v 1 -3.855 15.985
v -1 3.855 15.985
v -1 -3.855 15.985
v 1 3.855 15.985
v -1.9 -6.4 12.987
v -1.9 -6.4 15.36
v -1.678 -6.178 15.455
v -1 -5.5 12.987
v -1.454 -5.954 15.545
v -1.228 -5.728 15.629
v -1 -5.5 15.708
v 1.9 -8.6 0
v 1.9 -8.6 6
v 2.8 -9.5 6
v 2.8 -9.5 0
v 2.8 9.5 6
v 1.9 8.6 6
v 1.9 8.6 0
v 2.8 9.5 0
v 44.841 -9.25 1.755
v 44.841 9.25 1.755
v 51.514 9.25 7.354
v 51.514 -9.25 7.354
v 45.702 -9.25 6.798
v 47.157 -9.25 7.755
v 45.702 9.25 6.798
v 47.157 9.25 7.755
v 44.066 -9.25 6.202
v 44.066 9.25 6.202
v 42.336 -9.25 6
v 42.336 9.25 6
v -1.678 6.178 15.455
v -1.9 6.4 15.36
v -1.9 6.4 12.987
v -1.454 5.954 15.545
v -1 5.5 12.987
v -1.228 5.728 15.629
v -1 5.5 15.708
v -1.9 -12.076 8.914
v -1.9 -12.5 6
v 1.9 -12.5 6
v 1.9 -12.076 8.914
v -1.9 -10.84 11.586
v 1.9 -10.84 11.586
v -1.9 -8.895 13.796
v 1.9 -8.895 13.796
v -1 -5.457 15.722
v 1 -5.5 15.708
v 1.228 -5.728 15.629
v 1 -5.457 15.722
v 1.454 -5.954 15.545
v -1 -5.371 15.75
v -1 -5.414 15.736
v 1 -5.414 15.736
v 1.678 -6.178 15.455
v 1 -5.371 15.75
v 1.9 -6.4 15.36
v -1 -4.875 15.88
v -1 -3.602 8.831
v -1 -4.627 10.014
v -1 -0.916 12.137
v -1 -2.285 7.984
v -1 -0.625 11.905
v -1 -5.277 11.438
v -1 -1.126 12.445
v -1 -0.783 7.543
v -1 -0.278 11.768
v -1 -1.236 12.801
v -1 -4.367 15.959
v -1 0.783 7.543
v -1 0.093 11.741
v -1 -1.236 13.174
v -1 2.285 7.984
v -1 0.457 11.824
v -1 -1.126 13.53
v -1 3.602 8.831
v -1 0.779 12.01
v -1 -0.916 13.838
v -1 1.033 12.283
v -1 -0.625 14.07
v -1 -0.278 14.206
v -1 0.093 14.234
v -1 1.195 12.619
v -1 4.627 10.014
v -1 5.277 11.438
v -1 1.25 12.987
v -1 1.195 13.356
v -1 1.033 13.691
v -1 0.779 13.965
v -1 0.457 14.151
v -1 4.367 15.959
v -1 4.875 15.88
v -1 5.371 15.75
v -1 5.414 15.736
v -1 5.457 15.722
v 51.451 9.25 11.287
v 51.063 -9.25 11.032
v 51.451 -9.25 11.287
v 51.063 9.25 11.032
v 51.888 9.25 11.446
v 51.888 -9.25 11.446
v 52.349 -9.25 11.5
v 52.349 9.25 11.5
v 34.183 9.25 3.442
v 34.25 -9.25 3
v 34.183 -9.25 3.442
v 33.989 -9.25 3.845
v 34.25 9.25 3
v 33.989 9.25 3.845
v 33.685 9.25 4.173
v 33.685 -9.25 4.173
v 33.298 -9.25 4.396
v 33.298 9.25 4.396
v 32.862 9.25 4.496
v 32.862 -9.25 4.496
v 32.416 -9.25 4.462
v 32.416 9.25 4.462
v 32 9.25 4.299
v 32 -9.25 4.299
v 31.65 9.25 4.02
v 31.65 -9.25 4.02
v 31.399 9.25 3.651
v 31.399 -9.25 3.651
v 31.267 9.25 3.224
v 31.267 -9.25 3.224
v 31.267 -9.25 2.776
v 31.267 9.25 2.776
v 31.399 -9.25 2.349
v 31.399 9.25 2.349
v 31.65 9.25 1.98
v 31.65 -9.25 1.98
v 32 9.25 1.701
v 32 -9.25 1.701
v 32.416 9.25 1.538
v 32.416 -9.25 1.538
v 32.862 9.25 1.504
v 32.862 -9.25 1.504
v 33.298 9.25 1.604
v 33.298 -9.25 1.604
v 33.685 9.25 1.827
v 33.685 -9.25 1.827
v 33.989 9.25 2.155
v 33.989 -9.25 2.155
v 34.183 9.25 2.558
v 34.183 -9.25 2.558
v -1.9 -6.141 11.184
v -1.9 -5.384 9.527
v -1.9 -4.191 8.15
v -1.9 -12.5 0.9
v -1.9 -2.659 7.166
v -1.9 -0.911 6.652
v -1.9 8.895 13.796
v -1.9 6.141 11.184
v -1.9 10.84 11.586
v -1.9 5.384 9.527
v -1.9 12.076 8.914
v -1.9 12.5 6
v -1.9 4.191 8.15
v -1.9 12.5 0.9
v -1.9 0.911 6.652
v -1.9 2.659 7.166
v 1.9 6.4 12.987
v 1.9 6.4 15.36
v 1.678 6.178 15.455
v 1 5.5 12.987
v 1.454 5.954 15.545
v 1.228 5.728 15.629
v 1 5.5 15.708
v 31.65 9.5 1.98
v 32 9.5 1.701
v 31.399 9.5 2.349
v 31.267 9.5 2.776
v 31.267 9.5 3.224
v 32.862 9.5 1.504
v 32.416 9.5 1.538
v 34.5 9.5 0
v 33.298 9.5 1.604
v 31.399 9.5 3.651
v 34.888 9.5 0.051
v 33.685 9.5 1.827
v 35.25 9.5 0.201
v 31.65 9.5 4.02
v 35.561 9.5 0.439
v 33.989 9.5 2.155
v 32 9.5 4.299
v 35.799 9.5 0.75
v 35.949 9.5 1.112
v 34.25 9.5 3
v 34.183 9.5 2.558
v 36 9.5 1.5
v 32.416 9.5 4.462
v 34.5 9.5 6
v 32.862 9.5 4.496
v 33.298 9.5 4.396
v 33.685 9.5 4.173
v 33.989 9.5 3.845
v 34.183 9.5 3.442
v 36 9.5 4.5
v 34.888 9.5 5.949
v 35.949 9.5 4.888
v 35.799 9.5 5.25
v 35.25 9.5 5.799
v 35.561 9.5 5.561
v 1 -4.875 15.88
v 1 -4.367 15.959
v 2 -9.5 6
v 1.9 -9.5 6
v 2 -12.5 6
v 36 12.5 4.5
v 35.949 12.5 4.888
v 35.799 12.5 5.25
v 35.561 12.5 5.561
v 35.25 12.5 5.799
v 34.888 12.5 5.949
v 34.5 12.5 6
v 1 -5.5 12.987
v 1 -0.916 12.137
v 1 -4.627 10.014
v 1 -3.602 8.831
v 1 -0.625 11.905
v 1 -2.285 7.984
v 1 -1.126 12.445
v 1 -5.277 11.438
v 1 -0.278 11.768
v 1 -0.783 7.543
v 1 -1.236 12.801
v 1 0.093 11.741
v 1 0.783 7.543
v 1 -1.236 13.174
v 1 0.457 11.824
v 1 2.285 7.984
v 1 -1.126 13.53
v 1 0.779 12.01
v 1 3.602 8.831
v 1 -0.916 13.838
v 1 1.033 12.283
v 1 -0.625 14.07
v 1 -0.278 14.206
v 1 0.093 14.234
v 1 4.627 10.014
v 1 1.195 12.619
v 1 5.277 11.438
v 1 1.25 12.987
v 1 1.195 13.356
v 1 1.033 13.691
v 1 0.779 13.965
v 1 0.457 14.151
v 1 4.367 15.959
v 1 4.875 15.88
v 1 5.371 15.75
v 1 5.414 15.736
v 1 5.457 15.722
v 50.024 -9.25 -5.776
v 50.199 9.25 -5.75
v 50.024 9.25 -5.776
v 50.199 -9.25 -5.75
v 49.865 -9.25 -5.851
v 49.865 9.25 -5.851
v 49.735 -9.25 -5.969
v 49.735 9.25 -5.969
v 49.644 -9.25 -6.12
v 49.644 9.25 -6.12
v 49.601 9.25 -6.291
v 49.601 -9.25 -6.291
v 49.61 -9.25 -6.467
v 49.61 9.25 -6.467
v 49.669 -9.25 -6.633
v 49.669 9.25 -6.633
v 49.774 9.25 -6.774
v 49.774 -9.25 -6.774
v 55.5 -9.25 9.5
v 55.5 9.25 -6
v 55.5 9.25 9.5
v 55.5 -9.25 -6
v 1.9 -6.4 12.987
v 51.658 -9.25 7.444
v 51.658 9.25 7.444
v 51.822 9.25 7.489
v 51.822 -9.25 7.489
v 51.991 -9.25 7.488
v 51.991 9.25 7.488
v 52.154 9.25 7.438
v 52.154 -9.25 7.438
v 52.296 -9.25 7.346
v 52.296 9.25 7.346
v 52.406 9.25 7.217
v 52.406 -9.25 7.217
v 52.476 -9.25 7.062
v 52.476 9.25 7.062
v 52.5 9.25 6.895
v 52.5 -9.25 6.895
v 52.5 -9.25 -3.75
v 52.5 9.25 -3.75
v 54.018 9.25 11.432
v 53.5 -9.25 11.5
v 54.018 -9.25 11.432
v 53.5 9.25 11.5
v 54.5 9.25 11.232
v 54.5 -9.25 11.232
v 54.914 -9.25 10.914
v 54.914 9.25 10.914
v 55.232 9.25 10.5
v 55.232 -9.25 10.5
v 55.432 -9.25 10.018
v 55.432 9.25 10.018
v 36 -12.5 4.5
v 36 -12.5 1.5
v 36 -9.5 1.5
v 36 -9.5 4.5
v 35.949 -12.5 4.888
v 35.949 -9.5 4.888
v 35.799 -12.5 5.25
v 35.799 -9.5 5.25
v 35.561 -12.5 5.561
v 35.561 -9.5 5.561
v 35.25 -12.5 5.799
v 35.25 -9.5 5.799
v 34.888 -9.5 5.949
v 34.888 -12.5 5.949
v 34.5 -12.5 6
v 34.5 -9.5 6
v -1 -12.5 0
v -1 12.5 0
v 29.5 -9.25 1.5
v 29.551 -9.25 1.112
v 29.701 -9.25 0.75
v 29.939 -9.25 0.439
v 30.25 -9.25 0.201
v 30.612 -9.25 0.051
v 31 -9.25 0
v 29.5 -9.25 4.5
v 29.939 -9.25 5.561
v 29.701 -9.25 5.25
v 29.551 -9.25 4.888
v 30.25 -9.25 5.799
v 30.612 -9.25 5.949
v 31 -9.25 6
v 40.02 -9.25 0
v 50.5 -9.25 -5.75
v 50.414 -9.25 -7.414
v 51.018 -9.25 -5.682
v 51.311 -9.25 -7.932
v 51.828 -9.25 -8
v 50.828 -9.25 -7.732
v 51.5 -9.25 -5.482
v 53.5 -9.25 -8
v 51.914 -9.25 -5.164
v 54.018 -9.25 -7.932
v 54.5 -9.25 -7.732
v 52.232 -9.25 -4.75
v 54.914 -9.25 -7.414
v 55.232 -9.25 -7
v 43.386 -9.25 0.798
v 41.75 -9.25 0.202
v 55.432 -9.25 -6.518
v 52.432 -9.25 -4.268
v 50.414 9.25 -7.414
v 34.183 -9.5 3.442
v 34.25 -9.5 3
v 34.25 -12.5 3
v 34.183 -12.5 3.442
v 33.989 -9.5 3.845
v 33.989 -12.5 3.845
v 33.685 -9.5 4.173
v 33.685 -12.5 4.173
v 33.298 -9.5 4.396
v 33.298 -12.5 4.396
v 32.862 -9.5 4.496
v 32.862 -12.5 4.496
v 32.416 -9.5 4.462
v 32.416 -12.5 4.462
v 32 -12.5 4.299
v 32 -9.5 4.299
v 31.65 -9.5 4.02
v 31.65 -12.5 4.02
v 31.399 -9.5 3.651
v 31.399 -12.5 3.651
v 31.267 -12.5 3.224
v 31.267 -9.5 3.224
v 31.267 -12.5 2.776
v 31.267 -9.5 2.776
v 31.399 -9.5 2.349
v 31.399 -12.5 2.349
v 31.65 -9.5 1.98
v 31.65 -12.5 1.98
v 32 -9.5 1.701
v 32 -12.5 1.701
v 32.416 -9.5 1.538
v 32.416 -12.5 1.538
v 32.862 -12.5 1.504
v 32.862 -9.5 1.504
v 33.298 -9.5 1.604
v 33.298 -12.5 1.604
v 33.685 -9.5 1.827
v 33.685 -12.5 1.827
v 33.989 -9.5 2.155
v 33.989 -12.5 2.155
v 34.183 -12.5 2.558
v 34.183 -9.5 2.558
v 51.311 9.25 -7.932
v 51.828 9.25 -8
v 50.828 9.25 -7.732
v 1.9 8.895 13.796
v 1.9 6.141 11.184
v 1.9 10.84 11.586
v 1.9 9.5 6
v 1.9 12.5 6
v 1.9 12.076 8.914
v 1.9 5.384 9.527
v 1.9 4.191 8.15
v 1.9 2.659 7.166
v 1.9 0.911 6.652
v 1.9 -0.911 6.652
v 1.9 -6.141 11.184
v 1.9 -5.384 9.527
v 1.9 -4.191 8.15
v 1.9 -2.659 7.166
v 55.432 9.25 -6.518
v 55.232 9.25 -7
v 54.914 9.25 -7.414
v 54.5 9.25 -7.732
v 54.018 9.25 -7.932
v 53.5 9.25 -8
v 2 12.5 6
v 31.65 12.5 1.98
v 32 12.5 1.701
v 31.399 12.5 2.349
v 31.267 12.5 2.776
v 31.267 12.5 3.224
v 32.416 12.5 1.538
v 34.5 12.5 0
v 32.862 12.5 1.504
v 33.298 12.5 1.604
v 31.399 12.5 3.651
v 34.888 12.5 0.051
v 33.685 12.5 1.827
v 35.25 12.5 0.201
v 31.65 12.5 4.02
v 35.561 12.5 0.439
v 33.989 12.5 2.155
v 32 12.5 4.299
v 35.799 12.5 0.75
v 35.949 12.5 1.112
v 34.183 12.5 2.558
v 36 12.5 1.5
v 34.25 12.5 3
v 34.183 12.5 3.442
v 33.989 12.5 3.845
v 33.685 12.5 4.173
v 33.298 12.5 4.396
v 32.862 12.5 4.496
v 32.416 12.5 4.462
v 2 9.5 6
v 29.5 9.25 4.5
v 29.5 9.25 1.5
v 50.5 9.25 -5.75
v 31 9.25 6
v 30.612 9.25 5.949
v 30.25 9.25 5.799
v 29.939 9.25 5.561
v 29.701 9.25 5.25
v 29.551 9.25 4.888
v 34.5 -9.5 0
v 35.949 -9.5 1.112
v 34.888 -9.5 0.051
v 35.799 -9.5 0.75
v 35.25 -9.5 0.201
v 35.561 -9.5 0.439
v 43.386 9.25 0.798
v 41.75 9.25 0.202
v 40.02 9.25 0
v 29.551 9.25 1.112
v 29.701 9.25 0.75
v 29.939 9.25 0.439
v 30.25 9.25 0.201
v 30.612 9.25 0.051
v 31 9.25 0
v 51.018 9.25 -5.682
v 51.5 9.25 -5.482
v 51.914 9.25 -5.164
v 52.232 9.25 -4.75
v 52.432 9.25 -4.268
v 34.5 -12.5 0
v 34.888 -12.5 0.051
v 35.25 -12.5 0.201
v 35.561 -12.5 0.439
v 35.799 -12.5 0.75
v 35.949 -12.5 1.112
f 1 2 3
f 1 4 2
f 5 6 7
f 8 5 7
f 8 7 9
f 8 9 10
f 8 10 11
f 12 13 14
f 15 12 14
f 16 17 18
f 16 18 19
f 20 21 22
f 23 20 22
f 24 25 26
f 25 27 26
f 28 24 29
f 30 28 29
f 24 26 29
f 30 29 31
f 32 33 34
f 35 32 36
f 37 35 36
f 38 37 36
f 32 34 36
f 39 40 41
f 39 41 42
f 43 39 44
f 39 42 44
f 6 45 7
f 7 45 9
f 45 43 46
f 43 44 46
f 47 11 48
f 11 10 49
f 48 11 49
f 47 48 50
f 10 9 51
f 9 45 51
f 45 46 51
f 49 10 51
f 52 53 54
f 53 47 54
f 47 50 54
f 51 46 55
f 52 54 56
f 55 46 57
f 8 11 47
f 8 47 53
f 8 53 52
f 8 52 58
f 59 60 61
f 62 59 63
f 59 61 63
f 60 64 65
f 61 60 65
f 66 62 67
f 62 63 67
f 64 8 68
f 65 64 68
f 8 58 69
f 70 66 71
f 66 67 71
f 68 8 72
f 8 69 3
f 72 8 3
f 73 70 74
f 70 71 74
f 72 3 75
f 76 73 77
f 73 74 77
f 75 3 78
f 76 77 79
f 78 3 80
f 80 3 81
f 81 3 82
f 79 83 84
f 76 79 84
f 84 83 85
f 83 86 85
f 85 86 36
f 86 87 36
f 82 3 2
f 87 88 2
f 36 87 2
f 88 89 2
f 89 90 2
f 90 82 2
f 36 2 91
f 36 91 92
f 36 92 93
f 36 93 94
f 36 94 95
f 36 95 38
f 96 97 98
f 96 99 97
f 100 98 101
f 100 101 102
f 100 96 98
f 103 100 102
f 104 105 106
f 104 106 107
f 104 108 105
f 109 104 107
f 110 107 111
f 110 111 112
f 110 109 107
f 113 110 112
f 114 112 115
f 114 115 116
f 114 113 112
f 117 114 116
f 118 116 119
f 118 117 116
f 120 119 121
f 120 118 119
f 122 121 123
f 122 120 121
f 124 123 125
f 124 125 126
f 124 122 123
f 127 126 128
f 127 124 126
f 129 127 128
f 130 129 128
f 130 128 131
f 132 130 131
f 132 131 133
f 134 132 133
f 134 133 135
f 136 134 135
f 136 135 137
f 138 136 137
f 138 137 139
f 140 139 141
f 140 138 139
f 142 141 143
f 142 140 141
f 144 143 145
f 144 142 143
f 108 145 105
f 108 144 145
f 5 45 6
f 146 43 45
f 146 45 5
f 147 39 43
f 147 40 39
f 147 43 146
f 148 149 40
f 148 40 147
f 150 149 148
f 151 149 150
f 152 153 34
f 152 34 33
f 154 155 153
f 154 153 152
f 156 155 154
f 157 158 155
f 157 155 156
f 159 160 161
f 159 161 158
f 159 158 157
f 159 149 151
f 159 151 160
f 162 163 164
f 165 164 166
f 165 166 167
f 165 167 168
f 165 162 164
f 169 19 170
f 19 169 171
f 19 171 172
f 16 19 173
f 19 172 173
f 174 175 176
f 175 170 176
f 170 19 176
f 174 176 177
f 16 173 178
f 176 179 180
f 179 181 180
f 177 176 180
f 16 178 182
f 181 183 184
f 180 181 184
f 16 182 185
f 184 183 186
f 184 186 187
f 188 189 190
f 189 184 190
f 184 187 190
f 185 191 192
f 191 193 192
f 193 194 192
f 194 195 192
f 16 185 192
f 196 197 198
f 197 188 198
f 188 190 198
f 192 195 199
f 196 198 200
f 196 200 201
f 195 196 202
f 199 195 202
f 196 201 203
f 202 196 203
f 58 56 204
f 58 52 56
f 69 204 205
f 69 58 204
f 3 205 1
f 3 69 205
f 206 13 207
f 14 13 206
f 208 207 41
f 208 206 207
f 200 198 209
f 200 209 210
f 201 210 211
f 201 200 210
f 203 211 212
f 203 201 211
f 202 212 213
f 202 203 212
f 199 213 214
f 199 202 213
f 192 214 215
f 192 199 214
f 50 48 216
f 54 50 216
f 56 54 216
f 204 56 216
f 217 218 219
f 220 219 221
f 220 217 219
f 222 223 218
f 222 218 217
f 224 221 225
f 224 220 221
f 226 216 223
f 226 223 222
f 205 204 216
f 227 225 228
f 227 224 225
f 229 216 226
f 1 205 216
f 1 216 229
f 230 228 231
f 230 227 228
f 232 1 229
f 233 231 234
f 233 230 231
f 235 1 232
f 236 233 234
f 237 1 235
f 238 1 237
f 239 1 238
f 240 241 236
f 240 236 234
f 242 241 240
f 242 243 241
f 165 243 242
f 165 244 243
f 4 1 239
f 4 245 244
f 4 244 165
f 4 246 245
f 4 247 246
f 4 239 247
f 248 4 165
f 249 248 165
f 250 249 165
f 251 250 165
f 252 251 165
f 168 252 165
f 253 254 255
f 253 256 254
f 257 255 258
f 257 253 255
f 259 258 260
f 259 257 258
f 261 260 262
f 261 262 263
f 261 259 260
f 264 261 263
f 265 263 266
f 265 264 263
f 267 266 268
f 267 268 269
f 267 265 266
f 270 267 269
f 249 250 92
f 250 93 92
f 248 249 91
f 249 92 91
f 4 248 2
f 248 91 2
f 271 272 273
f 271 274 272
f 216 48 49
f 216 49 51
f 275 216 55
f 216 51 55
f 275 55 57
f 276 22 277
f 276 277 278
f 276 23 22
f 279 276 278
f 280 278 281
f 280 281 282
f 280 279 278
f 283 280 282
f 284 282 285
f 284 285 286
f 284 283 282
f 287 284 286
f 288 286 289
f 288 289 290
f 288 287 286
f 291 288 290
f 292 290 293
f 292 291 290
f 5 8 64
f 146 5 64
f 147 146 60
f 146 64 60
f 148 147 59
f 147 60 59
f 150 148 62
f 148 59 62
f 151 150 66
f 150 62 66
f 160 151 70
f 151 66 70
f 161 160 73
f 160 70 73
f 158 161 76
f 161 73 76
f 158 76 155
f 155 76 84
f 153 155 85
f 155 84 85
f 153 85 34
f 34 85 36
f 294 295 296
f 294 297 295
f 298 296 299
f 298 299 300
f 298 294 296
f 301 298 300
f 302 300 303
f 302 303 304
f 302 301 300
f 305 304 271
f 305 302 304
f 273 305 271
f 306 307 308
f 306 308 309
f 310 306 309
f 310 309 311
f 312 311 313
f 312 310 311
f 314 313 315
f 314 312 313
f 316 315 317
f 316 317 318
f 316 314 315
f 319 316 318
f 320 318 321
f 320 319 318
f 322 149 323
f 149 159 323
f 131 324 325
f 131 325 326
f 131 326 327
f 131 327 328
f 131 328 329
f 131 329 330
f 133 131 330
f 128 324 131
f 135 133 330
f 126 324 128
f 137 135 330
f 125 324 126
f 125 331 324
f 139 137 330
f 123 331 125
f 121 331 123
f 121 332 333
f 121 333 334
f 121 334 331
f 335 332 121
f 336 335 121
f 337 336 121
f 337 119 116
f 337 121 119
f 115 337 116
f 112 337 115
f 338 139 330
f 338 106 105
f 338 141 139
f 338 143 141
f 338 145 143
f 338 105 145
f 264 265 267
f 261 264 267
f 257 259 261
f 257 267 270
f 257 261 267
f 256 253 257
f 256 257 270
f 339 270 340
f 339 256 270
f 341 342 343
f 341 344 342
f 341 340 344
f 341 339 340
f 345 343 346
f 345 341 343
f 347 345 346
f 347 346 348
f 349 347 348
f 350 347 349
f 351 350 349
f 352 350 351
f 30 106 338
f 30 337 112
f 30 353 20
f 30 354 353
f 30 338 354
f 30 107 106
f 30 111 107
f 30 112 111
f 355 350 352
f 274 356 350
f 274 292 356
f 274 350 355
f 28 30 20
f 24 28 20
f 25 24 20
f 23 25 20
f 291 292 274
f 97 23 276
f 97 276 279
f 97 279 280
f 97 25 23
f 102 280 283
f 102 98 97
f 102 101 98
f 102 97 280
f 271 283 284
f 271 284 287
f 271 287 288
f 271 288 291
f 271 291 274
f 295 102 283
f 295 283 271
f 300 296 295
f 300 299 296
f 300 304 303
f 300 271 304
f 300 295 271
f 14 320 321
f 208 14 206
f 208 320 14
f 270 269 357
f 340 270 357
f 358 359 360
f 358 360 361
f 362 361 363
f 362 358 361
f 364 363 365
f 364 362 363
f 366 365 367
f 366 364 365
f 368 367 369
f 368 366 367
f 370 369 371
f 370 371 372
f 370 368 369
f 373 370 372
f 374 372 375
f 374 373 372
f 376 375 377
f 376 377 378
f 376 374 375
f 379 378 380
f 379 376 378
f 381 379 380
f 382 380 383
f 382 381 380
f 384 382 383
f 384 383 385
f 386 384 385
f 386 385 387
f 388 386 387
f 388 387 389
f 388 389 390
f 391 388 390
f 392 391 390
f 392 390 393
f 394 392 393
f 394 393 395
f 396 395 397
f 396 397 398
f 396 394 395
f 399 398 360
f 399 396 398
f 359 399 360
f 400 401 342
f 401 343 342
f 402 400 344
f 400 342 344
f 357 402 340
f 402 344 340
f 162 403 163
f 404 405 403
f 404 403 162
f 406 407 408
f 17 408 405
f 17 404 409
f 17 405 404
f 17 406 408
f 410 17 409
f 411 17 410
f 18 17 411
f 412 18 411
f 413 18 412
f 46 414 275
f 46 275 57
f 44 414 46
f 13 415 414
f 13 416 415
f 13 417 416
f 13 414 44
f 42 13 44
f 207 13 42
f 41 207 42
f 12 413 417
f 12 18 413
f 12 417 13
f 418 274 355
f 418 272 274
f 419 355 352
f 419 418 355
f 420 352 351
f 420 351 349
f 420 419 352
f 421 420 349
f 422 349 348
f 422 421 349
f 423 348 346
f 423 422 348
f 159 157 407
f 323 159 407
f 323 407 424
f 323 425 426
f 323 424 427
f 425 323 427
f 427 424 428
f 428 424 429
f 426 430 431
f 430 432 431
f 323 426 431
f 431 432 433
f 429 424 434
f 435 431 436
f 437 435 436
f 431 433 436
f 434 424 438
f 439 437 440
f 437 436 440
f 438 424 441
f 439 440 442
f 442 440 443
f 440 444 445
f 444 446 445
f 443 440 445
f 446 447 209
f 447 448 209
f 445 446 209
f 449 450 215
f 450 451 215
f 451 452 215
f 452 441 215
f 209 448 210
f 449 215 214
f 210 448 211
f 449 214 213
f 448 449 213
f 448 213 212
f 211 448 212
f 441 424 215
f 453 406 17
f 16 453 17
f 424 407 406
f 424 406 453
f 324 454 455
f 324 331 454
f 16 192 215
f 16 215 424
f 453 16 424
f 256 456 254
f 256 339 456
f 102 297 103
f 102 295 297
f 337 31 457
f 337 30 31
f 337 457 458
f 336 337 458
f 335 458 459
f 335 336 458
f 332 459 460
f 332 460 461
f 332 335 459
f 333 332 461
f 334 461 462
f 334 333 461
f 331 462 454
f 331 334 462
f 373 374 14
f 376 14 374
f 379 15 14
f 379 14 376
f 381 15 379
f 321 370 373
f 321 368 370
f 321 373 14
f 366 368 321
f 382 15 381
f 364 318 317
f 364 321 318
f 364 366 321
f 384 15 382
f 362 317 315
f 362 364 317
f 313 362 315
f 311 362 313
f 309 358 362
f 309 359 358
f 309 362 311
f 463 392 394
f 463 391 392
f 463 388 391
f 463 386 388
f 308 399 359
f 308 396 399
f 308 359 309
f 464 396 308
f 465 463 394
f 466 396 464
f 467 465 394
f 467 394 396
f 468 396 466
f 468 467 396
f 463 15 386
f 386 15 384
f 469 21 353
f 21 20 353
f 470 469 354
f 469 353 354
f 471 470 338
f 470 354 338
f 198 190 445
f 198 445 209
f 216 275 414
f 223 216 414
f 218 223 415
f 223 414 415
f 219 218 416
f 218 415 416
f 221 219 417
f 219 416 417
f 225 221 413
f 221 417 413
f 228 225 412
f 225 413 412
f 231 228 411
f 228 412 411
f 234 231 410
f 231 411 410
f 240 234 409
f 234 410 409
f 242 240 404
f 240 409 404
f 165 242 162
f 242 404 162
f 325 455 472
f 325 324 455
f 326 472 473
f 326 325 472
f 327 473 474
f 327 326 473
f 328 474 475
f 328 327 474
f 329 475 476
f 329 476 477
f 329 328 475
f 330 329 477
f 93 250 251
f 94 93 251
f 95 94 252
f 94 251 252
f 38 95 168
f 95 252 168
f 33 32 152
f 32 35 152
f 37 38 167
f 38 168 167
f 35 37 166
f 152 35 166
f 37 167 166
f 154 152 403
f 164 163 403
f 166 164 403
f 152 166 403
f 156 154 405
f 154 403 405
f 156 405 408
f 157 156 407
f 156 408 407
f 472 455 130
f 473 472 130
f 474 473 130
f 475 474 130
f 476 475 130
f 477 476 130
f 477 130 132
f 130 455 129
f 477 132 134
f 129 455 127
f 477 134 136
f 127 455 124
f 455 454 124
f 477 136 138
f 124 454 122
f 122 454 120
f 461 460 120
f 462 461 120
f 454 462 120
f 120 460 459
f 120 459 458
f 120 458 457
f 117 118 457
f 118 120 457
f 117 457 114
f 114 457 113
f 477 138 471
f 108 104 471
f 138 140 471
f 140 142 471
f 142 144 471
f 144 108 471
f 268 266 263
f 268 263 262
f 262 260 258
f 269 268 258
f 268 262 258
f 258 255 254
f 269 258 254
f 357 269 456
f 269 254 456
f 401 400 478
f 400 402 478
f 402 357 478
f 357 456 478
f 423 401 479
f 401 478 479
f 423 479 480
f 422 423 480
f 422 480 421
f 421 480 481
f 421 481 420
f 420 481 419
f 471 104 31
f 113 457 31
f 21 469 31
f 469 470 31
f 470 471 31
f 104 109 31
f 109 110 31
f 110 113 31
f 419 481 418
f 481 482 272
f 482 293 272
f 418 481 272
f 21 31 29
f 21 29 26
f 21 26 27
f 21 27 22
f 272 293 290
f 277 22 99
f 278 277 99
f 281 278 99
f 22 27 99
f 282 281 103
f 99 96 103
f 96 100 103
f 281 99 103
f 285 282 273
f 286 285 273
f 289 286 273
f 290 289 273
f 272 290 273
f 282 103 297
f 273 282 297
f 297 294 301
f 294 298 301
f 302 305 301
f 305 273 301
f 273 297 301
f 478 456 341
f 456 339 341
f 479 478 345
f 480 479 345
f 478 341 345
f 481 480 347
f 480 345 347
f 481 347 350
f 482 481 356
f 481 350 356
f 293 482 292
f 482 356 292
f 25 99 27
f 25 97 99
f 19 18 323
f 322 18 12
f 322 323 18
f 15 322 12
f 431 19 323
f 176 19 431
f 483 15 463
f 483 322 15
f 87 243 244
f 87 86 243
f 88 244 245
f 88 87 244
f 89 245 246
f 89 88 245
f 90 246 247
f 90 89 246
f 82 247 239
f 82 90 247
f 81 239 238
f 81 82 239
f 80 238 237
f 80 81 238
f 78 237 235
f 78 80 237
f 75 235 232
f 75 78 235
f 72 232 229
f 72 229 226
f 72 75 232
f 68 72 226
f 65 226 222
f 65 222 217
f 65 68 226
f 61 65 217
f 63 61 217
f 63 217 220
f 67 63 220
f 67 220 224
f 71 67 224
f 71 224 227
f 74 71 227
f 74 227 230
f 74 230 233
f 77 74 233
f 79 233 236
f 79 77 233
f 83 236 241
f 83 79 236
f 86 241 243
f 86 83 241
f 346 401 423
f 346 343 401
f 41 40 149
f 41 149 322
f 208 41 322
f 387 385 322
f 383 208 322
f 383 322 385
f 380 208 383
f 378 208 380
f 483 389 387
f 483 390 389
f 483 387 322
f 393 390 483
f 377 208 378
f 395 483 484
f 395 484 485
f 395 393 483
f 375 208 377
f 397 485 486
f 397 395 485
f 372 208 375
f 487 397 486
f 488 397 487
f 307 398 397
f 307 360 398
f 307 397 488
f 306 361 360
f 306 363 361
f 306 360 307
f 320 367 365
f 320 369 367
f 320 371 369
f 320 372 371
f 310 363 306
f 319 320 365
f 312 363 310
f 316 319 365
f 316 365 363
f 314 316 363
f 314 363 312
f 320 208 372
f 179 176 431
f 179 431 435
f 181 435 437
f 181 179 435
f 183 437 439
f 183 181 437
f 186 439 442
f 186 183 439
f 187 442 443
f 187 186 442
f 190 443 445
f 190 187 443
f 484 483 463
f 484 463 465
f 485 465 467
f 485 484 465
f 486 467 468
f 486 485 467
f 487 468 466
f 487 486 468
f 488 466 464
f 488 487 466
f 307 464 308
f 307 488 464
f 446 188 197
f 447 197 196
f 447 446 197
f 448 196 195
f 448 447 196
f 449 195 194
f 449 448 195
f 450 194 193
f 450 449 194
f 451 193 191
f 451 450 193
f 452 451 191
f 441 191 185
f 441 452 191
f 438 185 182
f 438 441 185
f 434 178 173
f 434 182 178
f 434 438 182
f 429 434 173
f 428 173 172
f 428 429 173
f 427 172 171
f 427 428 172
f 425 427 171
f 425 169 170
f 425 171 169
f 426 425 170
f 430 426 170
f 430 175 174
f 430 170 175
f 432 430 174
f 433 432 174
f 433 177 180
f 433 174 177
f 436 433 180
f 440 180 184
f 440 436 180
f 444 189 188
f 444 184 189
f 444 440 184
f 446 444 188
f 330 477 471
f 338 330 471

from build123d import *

# Parameters (mm, degrees)
F2_R          = 1.5
F5_DEPTH      = 12.5
F3_W          = 57.0000079349
F3_H          = 35
F3_W_2        = 5.9000002086
F3_H_2        = 3.0000003055
F6_DEPTH      = 25
F0_W          = 40
F0_H          = 30
F0_R          = 1.2500888111
F7_DEPTH      = 2
F8_DEPTH      = 1
F9_DEPTH      = 0.1
F10_DEPTH     = 0.1
F11_T4_DEPTH  = 8.3145145654
F11_T9_DEPTH  = 8.3145145654
F11_T11_DEPTH = 29.6290293933
F11_T16_ANGLE = 180
F11_T21_ANGLE = 180
F11_T26_DEPTH = 5.2499087538
F11_T31_DEPTH = 5.2499087441
F11_T36_DEPTH = 5.2499087441
F11_T41_DEPTH = 5.2499087538
F4_R          = 1.5
F12_DEPTH     = 9.25
F13_R         = 2
F14_R         = 7.5
F15_R         = 0.6
F1_W          = 40
F1_H          = 30
F16_DEPTH     = 12.5
F17_R         = 5


# Not quite as in the source:
# - a fillet or chamfer that OpenCascade refuses, or shapes differently, is made with other operations: its cross-section is extruded or revolved along the edge and cut away or added
# - ends of sketch curves that miss each other by under 0.0002 mm in the source are joined


with BuildPart() as f5:
    # F2 (on Front) → F5 (new body, symmetric)
    with BuildSketch(Plane.XZ):
        with BuildLine():
            Line((-6.5000004037, -1.225e-07), (34.4999995679, -1.225e-07))
            ThreePointArc((34.4999995679, -1.225e-07), (35.5606597229, 0.4393396988), (35.9999995441, 1.4999998538))
            Line((35.9999995441, 1.4999998538), (35.9999995441, 4.4999998063))
            ThreePointArc((35.9999995441, 4.4999998063), (35.5606597229, 5.5606599613), (34.4999995679, 5.9999997825))
            Line((34.4999995706, 5.9999997825), (1.9999998119, 5.9999998409))
            Line((1.9999998119, 5.999999905), (1.9999998119, 16))
            Line((1.9999998119, 16), (-2.000000095, 16))
            Line((-2.000000095, 16), (-2.000000095, 5.9999998557))
            Line((-2.000000095, 5.9999997745), (-6.500000401, 5.9999997825))
            ThreePointArc((-6.5000004037, 5.9999997825), (-7.5606605587, 5.5606599613), (-8.00000038, 4.4999998063))
            Line((-8.00000038, 4.4999998063), (-8.00000038, 1.4999998538))
            ThreePointArc((-8.00000038, 1.4999998538), (-7.5606605587, 0.4393396988), (-6.5000004037, -1.225e-07))
        make_face()
        with Locations((-4.7500003907, 2.9999998668)):
            Circle(F2_R, mode=Mode.SUBTRACT)
        with Locations((32.7499995548, 2.99999983)):
            Circle(F2_R, mode=Mode.SUBTRACT)
    extrude(amount=F5_DEPTH, both=True)

    # F3 (on Top) → F6 (cut)
    with BuildSketch(Plane.XY):
        with Locations((15.4999917634, -7.45e-08)):
            Rectangle(F3_W, F3_H)
        Polygon((-7.9000002086, 12.5), (-2, 12.5), (1.9999999069, 12.5), (35.9999998473, 12.5), (35.9999998473, 9.4999996945), (1.9999999069, 9.4999996945), (1.9999999069, -9.4999996945), (35.9999998473, -9.4999996945), (35.9999998473, -12.5), (1.9999999069, -12.5), (-2, -12.5), (-7.9000002086, -12.5), (-7.9000002086, -9.4999996945), (-2, -9.4999996945), (-2, 9.4999996945), (-7.9000002086, 9.4999996945), align=None, mode=Mode.SUBTRACT)
        with Locations((-4.9500001043, 10.9999998473)):
            Rectangle(F3_W_2, F3_H_2)
        with Locations((-4.9500001043, -10.9999998473)):
            Rectangle(F3_W_2, F3_H_2)
    extrude(amount=F6_DEPTH, mode=Mode.SUBTRACT)

    # F0 (on Right) → F7 (cut, symmetric)
    with BuildSketch(Plane.YZ):
        with Locations((4.47e-07, 7.9853728972)):
            Rectangle(F0_W, F0_H)
        with BuildLine():
            Line((12.5, -0.0146211902), (-12.5, -0.0146211902))
            Line((-12.5, -0.0146211902), (-12.5, 7.9853788098))
            ThreePointArc((-12.5, 7.9853788098), (-10.5000000081, 13.276881496), (-5.5, 15.9226329138))
            ThreePointArc((-5.5, 15.9226329138), (-5.000983204, 15.9696770716), (-4.4999998063, 15.9853790035))
            Line((-4.4999998063, 15.9853790035), (4.4999998063, 15.9853790035))
            ThreePointArc((4.4999998063, 15.9853790035), (5.000983204, 15.9696770716), (5.5, 15.9226329138))
            ThreePointArc((5.5, 15.9226329138), (10.5000000081, 13.276881496), (12.5, 7.9853788098))
            Line((12.5, 7.9853788098), (12.5, -0.0146211902))
        make_face(mode=Mode.SUBTRACT)
        with BuildLine():
            ThreePointArc((-4.4999998063, 15.9853790035), (-5.000983204, 15.9696770716), (-5.5, 15.9226329138))
            Line((-5.5, 15.9226329138), (-5.5, 12.9872388524))
            ThreePointArc((-5.5, 12.9872388524), (0, 7.4872388524), (5.5, 12.9872388524))
            Line((5.5, 12.9872388524), (5.5, 15.9226329138))
            ThreePointArc((5.5, 15.9226329138), (5.000983204, 15.9696770716), (4.4999998063, 15.9853790035))
            Line((4.4999998063, 15.9853790035), (-4.4999998063, 15.9853790035))
        make_face()
        with Locations((0, 12.9872388524)):
            Circle(F0_R, mode=Mode.SUBTRACT)
        with Locations((0, 12.9872388524)):
            Circle(F0_R)
    extrude(amount=F7_DEPTH, both=True, mode=Mode.SUBTRACT)

    # F0 (on Right) → F8 (join, symmetric)
    with BuildSketch(Plane.YZ):
        with BuildLine():
            ThreePointArc((-4.4999998063, 15.9853790035), (-5.000983204, 15.9696770716), (-5.5, 15.9226329138))
            Line((-5.5, 15.9226329138), (-5.5, 12.9872388524))
            ThreePointArc((-5.5, 12.9872388524), (0, 7.4872388524), (5.5, 12.9872388524))
            Line((5.5, 12.9872388524), (5.5, 15.9226329138))
            ThreePointArc((5.5, 15.9226329138), (5.000983204, 15.9696770716), (4.4999998063, 15.9853790035))
            Line((4.4999998063, 15.9853790035), (-4.4999998063, 15.9853790035))
        make_face()
        with Locations((0, 12.9872388524)):
            Circle(F0_R, mode=Mode.SUBTRACT)
    extrude(amount=F8_DEPTH, both=True)

    # F9 (cut): a face of the model
    f9_faces = [f5.faces().sort_by_distance(p)[0] for p in [
        (1.9999998119, 0, 6.6984167583),
    ]]
    extrude(f9_faces, amount=-F9_DEPTH, mode=Mode.SUBTRACT)

    # F10 (cut): a face of the model
    f10_faces = [f5.faces().sort_by_distance(p)[0] for p in [
        (-2.000000095, 0, 6.2419959068),
    ]]
    extrude(f10_faces, amount=-F10_DEPTH, mode=Mode.SUBTRACT)

    # F11: chamfer of 0.9 on 9 edges, made by hand


with BuildPart() as f11_tool2:
    # F11_s3 → F11_t4 (new body)
    with BuildSketch(Plane.XY.offset(-2.3145146924)):
        with BuildLine():
            Line((1.8745439664, 8.5745438517), (2.8254557523, 9.5254555373))
            Line((2.8254557523, 9.5254555373), (2.8254557523, 9.5434555373))
            ThreePointArc((2.8254557523, 9.5434555373), (2.3627278296, 9.5179996945), (1.8999999069, 9.5179996945))
            Line((1.8999999069, 9.5179996945), (1.8819999069, 9.4999996945))
            ThreePointArc((1.8819999069, 9.4999996945), (1.8819998119, 9.0372717731), (1.8565439664, 8.5745438517))
            Line((1.8565439664, 8.5745438517), (1.8745439664, 8.5745438517))
        make_face()
    extrude(amount=F11_T4_DEPTH)

    split(bisect_by=Plane.XY.offset(-1.225e-07), keep=Keep.TOP)


with BuildPart() as f5_1:
    add(f5.part)

    # F11_t1: union F11_tool2
    add(f11_tool2.part)


with BuildPart() as f11_tool7:
    # F11_s8 → F11_t9 (new body)
    with BuildSketch(Plane.XY.offset(-2.3145146924)):
        with BuildLine():
            Line((1.8745439664, -8.5745438517), (2.8254557523, -9.5254555373))
            Line((2.8254557523, -9.5254555373), (2.8254557523, -9.5434555373))
            ThreePointArc((2.8254557523, -9.5434555373), (2.3627278296, -9.5179996945), (1.8999999069, -9.5179996945))
            Line((1.8999999069, -9.5179996945), (1.8819999069, -9.4999996945))
            ThreePointArc((1.8819999069, -9.4999996945), (1.8819998119, -9.0372717731), (1.8565439664, -8.5745438517))
            Line((1.8565439664, -8.5745438517), (1.8745439664, -8.5745438517))
        make_face()
    extrude(amount=F11_T9_DEPTH)

    split(bisect_by=Plane.XY.offset(-1.225e-07), keep=Keep.TOP)


with BuildPart() as f5_2:
    add(f5_1.part)

    # F11_t6: union F11_tool7
    add(f11_tool7.part)

    # F11_s12 → F11_t11 (cut)
    with BuildSketch(Plane.XZ.offset(-14.8145146966)):
        with BuildLine():
            Line((-1.9254559387, 0.9254558445), (-0.9745441563, -0.025455967))
            Line((-0.9745441563, -0.025455967), (-0.9745441563, -0.043455967))
            ThreePointArc((-0.9745441563, -0.043455967), (-1.4372720781, -0.0180001225), (-1.9, -0.018))
            Line((-1.9, -0.018), (-1.918, 0))
            ThreePointArc((-1.918, 0), (-1.918000095, 0.4627279223), (-1.9434559387, 0.9254558445))
            Line((-1.9434559387, 0.9254558445), (-1.9254559387, 0.9254558445))
        make_face()
    extrude(amount=F11_T11_DEPTH, mode=Mode.SUBTRACT)


with BuildPart() as f11_tool14:
    # F11_s15 → F11_t16 (revolve)
    with BuildSketch(Plane.XY.offset(12.9872388524)):
        with BuildLine():
            Line((0.9745441585, -5.4745441532), (1.9254556533, -6.4254558468))
            Line((1.9254556533, -6.4254558468), (1.9434556533, -6.4254558468))
            ThreePointArc((1.9434556533, -6.4254558468), (1.9179998119, -5.9627279234), (1.918, -5.5))
            Line((1.918, -5.5), (1.9, -5.482))
            ThreePointArc((1.9, -5.482), (1.4372720793, -5.482), (0.9745441585, -5.4565441532))
            Line((0.9745441585, -5.4565441532), (0.9745441585, -5.4745441532))
        make_face()
    revolve(axis=Axis((1.9, 0, 12.9872388524), (1, 0, 0)), revolution_arc=F11_T16_ANGLE)

    split(bisect_by=Plane.YZ.offset(1), keep=Keep.TOP)


with BuildPart() as f5_3:
    add(f5_2.part)

    # F11_t13: cut F11_tool14
    add(f11_tool14.part, mode=Mode.SUBTRACT)


with BuildPart() as f11_tool19:
    # F11_s20 → F11_t21 (revolve)
    with BuildSketch(Plane.XY.offset(12.9872388524)):
        with BuildLine():
            Line((-1.9254559405, -6.4254558428), (-0.9745441545, -5.4745441572))
            Line((-0.9745441545, -5.4745441572), (-0.9745441545, -5.4565441572))
            ThreePointArc((-0.9745441545, -5.4565441572), (-1.4372720773, -5.482), (-1.9, -5.482))
            Line((-1.9, -5.482), (-1.918, -5.5))
            ThreePointArc((-1.918, -5.5), (-1.918000095, -5.9627279214), (-1.9434559405, -6.4254558428))
            Line((-1.9434559405, -6.4254558428), (-1.9254559405, -6.4254558428))
        make_face()
    revolve(axis=Axis((-1.9, 0, 12.9872388524), (1, 0, 0)), revolution_arc=F11_T21_ANGLE)

    split(bisect_by=Plane.YZ.offset(-1), keep=Keep.BOTTOM)


with BuildPart() as f5_4:
    add(f5_3.part)

    # F11_t18: cut F11_tool19
    add(f11_tool19.part, mode=Mode.SUBTRACT)


with BuildPart() as f11_tool24:
    # F11_s25 → F11_t26 (new body)
    with BuildSketch(Plane.XY.offset(12.9872388524)):
        with BuildLine():
            Line((-1.9254559405, 6.4254558428), (-0.9745441545, 5.4745441572))
            Line((-0.9745441545, 5.4745441572), (-0.9745441545, 5.4565441572))
            ThreePointArc((-0.9745441545, 5.4565441572), (-1.4372720773, 5.482), (-1.9, 5.482))
            Line((-1.9, 5.482), (-1.918, 5.5))
            ThreePointArc((-1.918, 5.5), (-1.918000095, 5.9627279214), (-1.9434559405, 6.4254558428))
            Line((-1.9434559405, 6.4254558428), (-1.9254559405, 6.4254558428))
        make_face()
    extrude(amount=F11_T26_DEPTH)

    split(bisect_by=Plane.YZ.offset(-1), keep=Keep.BOTTOM)


with BuildPart() as f5_5:
    add(f5_4.part)

    # F11_t23: cut F11_tool24
    add(f11_tool24.part, mode=Mode.SUBTRACT)


with BuildPart() as f11_tool29:
    # F11_s30 → F11_t31 (new body)
    with BuildSketch(Plane.XY.offset(12.9872388524)):
        with BuildLine():
            Line((1.9254556533, 6.4254558468), (0.9745441585, 5.4745441532))
            Line((0.9745441585, 5.4745441532), (0.9745441585, 5.4565441532))
            ThreePointArc((0.9745441585, 5.4565441532), (1.4372720793, 5.482), (1.9, 5.482))
            Line((1.9, 5.482), (1.918, 5.5))
            ThreePointArc((1.918, 5.5), (1.9179998119, 5.9627279234), (1.9434556533, 6.4254558468))
            Line((1.9434556533, 6.4254558468), (1.9254556533, 6.4254558468))
        make_face()
    extrude(amount=F11_T31_DEPTH)

    split(bisect_by=Plane.YZ.offset(1), keep=Keep.TOP)


with BuildPart() as f5_6:
    add(f5_5.part)

    # F11_t28: cut F11_tool29
    add(f11_tool29.part, mode=Mode.SUBTRACT)


with BuildPart() as f11_tool34:
    # F11_s35 → F11_t36 (new body)
    with BuildSketch(Plane.XY.offset(18.2371475965)):
        with BuildLine():
            Line((0.9745441585, -5.4745441532), (1.9254556533, -6.4254558468))
            Line((1.9254556533, -6.4254558468), (1.9434556533, -6.4254558468))
            ThreePointArc((1.9434556533, -6.4254558468), (1.9179998119, -5.9627279234), (1.918, -5.5))
            Line((1.918, -5.5), (1.9, -5.482))
            ThreePointArc((1.9, -5.482), (1.4372720793, -5.482), (0.9745441585, -5.4565441532))
            Line((0.9745441585, -5.4565441532), (0.9745441585, -5.4745441532))
        make_face()
    extrude(amount=-F11_T36_DEPTH)

    split(bisect_by=Plane.YZ.offset(1), keep=Keep.TOP)


with BuildPart() as f5_7:
    add(f5_6.part)

    # F11_t33: cut F11_tool34
    add(f11_tool34.part, mode=Mode.SUBTRACT)


with BuildPart() as f11_tool39:
    # F11_s40 → F11_t41 (new body)
    with BuildSketch(Plane.XY.offset(18.2371476062)):
        with BuildLine():
            Line((-1.9254559405, -6.4254558428), (-0.9745441545, -5.4745441572))
            Line((-0.9745441545, -5.4745441572), (-0.9745441545, -5.4565441572))
            ThreePointArc((-0.9745441545, -5.4565441572), (-1.4372720773, -5.482), (-1.9, -5.482))
            Line((-1.9, -5.482), (-1.918, -5.5))
            ThreePointArc((-1.918, -5.5), (-1.918000095, -5.9627279214), (-1.9434559405, -6.4254558428))
            Line((-1.9434559405, -6.4254558428), (-1.9254559405, -6.4254558428))
        make_face()
    extrude(amount=-F11_T41_DEPTH)

    split(bisect_by=Plane.YZ.offset(-1), keep=Keep.BOTTOM)


with BuildPart() as f5_8:
    add(f5_7.part)

    # F11_t38: cut F11_tool39
    add(f11_tool39.part, mode=Mode.SUBTRACT)

    # F1 (on Right) → F16 (cut, symmetric)
    with BuildSketch(Plane.YZ):
        with Locations((4.47e-07, 7.9853728972)):
            Rectangle(F1_W, F1_H)
        with BuildLine():
            Line((-4.4999998063, 15.9853790035), (4.4999998063, 15.9853790035))
            ThreePointArc((4.4999998063, 15.9853790035), (10.2533424116, 12.3974172553), (12.5, 5.9999997825))
            Line((12.5, 5.9999997825), (12.5, -0.0146211902))
            Line((12.5, -0.0146211902), (-12.5, -0.0146211902))
            Line((-12.5, -0.0146211902), (-12.5, 5.9999997825))
            ThreePointArc((-12.5, 5.9999997825), (-10.2533424116, 12.3974172553), (-4.4999998063, 15.9853790035))
        make_face(mode=Mode.SUBTRACT)
    extrude(amount=F16_DEPTH, both=True, mode=Mode.SUBTRACT)

    # F17
    f17_edges = [f5_8.edges().sort_by_distance(p)[0] for p in [
        (0, -4.5, 15.985379),
        (0, 4.5, 15.985379),
    ]]
    fillet(f17_edges, radius=F17_R)


with BuildPart() as f12:
    # F4 (on Front) → F12 (new body, symmetric)
    with BuildSketch(Plane.XZ):
        with BuildLine():
            ThreePointArc((29.4999995655, 1.4999998538), (29.9393393859, 0.4393396997), (30.9999995391, -1.225e-07))
            Line((30.9999995391, -1.225e-07), (42.7499995548, -1.436e-07))
            Line((42.7499995548, -1.436e-07), (52.5000281632, 8.1812452657))
            Line((52.5000281632, 8.1812452657), (52.5000281632, -5.7499710164))
            Line((52.5000281632, -5.7499710164), (48.7499994809, -5.7499708617))
            Line((48.7499994809, -5.7499708617), (51.0000307917, -8.0000022426))
            Line((51.0000307917, -8.0000022426), (55.5000305176, -8.0000024282))
            Line((55.5000305176, -8.0000024282), (55.5000305176, 11.5000018742))
            Line((55.5000305176, 11.5000018742), (51.6208254365, 11.5000018812))
            Line((51.6208254365, 11.5000018812), (45.0661781761, 5.9999997825))
            Line((45.0661781761, 5.9999997825), (30.9999995418, 5.9999997825))
            ThreePointArc((30.9999995418, 5.9999997825), (29.9393393868, 5.5606599613), (29.4999995655, 4.4999998063))
            Line((29.4999995655, 4.4999998063), (29.4999995655, 1.4999998538))
        make_face()
        with Locations((32.7499995548, 2.99999983)):
            Circle(F4_R, mode=Mode.SUBTRACT)
    extrude(amount=F12_DEPTH, both=True)

    # F13
    f13_edges = [f12.edges().sort_by_distance(p)[0] for p in [
        (51.620825, 0, 11.500002),
        (55.500031, 0, 11.500002),
        (55.500031, 0, -8.000002),
        (51.000031, 0, -8.000002),
        (52.500028, 0, -5.749971),
    ]]
    fillet(f13_edges, radius=F13_R)

    # F14
    f14_edges = [f12.edges().sort_by_distance(p)[0] for p in [
        (45.066178, 0, 6),
        (42.75, 0, 0),
    ]]
    fillet(f14_edges, radius=F14_R)

    # F15
    f15_edges = [f12.edges().sort_by_distance(p)[0] for p in [
        (52.500028, 0, 8.181245),
        (48.749999, 0, -5.749971),
    ]]
    fillet(f15_edges, radius=F15_R)


solid = Compound([f5_8.part, f12.part])
